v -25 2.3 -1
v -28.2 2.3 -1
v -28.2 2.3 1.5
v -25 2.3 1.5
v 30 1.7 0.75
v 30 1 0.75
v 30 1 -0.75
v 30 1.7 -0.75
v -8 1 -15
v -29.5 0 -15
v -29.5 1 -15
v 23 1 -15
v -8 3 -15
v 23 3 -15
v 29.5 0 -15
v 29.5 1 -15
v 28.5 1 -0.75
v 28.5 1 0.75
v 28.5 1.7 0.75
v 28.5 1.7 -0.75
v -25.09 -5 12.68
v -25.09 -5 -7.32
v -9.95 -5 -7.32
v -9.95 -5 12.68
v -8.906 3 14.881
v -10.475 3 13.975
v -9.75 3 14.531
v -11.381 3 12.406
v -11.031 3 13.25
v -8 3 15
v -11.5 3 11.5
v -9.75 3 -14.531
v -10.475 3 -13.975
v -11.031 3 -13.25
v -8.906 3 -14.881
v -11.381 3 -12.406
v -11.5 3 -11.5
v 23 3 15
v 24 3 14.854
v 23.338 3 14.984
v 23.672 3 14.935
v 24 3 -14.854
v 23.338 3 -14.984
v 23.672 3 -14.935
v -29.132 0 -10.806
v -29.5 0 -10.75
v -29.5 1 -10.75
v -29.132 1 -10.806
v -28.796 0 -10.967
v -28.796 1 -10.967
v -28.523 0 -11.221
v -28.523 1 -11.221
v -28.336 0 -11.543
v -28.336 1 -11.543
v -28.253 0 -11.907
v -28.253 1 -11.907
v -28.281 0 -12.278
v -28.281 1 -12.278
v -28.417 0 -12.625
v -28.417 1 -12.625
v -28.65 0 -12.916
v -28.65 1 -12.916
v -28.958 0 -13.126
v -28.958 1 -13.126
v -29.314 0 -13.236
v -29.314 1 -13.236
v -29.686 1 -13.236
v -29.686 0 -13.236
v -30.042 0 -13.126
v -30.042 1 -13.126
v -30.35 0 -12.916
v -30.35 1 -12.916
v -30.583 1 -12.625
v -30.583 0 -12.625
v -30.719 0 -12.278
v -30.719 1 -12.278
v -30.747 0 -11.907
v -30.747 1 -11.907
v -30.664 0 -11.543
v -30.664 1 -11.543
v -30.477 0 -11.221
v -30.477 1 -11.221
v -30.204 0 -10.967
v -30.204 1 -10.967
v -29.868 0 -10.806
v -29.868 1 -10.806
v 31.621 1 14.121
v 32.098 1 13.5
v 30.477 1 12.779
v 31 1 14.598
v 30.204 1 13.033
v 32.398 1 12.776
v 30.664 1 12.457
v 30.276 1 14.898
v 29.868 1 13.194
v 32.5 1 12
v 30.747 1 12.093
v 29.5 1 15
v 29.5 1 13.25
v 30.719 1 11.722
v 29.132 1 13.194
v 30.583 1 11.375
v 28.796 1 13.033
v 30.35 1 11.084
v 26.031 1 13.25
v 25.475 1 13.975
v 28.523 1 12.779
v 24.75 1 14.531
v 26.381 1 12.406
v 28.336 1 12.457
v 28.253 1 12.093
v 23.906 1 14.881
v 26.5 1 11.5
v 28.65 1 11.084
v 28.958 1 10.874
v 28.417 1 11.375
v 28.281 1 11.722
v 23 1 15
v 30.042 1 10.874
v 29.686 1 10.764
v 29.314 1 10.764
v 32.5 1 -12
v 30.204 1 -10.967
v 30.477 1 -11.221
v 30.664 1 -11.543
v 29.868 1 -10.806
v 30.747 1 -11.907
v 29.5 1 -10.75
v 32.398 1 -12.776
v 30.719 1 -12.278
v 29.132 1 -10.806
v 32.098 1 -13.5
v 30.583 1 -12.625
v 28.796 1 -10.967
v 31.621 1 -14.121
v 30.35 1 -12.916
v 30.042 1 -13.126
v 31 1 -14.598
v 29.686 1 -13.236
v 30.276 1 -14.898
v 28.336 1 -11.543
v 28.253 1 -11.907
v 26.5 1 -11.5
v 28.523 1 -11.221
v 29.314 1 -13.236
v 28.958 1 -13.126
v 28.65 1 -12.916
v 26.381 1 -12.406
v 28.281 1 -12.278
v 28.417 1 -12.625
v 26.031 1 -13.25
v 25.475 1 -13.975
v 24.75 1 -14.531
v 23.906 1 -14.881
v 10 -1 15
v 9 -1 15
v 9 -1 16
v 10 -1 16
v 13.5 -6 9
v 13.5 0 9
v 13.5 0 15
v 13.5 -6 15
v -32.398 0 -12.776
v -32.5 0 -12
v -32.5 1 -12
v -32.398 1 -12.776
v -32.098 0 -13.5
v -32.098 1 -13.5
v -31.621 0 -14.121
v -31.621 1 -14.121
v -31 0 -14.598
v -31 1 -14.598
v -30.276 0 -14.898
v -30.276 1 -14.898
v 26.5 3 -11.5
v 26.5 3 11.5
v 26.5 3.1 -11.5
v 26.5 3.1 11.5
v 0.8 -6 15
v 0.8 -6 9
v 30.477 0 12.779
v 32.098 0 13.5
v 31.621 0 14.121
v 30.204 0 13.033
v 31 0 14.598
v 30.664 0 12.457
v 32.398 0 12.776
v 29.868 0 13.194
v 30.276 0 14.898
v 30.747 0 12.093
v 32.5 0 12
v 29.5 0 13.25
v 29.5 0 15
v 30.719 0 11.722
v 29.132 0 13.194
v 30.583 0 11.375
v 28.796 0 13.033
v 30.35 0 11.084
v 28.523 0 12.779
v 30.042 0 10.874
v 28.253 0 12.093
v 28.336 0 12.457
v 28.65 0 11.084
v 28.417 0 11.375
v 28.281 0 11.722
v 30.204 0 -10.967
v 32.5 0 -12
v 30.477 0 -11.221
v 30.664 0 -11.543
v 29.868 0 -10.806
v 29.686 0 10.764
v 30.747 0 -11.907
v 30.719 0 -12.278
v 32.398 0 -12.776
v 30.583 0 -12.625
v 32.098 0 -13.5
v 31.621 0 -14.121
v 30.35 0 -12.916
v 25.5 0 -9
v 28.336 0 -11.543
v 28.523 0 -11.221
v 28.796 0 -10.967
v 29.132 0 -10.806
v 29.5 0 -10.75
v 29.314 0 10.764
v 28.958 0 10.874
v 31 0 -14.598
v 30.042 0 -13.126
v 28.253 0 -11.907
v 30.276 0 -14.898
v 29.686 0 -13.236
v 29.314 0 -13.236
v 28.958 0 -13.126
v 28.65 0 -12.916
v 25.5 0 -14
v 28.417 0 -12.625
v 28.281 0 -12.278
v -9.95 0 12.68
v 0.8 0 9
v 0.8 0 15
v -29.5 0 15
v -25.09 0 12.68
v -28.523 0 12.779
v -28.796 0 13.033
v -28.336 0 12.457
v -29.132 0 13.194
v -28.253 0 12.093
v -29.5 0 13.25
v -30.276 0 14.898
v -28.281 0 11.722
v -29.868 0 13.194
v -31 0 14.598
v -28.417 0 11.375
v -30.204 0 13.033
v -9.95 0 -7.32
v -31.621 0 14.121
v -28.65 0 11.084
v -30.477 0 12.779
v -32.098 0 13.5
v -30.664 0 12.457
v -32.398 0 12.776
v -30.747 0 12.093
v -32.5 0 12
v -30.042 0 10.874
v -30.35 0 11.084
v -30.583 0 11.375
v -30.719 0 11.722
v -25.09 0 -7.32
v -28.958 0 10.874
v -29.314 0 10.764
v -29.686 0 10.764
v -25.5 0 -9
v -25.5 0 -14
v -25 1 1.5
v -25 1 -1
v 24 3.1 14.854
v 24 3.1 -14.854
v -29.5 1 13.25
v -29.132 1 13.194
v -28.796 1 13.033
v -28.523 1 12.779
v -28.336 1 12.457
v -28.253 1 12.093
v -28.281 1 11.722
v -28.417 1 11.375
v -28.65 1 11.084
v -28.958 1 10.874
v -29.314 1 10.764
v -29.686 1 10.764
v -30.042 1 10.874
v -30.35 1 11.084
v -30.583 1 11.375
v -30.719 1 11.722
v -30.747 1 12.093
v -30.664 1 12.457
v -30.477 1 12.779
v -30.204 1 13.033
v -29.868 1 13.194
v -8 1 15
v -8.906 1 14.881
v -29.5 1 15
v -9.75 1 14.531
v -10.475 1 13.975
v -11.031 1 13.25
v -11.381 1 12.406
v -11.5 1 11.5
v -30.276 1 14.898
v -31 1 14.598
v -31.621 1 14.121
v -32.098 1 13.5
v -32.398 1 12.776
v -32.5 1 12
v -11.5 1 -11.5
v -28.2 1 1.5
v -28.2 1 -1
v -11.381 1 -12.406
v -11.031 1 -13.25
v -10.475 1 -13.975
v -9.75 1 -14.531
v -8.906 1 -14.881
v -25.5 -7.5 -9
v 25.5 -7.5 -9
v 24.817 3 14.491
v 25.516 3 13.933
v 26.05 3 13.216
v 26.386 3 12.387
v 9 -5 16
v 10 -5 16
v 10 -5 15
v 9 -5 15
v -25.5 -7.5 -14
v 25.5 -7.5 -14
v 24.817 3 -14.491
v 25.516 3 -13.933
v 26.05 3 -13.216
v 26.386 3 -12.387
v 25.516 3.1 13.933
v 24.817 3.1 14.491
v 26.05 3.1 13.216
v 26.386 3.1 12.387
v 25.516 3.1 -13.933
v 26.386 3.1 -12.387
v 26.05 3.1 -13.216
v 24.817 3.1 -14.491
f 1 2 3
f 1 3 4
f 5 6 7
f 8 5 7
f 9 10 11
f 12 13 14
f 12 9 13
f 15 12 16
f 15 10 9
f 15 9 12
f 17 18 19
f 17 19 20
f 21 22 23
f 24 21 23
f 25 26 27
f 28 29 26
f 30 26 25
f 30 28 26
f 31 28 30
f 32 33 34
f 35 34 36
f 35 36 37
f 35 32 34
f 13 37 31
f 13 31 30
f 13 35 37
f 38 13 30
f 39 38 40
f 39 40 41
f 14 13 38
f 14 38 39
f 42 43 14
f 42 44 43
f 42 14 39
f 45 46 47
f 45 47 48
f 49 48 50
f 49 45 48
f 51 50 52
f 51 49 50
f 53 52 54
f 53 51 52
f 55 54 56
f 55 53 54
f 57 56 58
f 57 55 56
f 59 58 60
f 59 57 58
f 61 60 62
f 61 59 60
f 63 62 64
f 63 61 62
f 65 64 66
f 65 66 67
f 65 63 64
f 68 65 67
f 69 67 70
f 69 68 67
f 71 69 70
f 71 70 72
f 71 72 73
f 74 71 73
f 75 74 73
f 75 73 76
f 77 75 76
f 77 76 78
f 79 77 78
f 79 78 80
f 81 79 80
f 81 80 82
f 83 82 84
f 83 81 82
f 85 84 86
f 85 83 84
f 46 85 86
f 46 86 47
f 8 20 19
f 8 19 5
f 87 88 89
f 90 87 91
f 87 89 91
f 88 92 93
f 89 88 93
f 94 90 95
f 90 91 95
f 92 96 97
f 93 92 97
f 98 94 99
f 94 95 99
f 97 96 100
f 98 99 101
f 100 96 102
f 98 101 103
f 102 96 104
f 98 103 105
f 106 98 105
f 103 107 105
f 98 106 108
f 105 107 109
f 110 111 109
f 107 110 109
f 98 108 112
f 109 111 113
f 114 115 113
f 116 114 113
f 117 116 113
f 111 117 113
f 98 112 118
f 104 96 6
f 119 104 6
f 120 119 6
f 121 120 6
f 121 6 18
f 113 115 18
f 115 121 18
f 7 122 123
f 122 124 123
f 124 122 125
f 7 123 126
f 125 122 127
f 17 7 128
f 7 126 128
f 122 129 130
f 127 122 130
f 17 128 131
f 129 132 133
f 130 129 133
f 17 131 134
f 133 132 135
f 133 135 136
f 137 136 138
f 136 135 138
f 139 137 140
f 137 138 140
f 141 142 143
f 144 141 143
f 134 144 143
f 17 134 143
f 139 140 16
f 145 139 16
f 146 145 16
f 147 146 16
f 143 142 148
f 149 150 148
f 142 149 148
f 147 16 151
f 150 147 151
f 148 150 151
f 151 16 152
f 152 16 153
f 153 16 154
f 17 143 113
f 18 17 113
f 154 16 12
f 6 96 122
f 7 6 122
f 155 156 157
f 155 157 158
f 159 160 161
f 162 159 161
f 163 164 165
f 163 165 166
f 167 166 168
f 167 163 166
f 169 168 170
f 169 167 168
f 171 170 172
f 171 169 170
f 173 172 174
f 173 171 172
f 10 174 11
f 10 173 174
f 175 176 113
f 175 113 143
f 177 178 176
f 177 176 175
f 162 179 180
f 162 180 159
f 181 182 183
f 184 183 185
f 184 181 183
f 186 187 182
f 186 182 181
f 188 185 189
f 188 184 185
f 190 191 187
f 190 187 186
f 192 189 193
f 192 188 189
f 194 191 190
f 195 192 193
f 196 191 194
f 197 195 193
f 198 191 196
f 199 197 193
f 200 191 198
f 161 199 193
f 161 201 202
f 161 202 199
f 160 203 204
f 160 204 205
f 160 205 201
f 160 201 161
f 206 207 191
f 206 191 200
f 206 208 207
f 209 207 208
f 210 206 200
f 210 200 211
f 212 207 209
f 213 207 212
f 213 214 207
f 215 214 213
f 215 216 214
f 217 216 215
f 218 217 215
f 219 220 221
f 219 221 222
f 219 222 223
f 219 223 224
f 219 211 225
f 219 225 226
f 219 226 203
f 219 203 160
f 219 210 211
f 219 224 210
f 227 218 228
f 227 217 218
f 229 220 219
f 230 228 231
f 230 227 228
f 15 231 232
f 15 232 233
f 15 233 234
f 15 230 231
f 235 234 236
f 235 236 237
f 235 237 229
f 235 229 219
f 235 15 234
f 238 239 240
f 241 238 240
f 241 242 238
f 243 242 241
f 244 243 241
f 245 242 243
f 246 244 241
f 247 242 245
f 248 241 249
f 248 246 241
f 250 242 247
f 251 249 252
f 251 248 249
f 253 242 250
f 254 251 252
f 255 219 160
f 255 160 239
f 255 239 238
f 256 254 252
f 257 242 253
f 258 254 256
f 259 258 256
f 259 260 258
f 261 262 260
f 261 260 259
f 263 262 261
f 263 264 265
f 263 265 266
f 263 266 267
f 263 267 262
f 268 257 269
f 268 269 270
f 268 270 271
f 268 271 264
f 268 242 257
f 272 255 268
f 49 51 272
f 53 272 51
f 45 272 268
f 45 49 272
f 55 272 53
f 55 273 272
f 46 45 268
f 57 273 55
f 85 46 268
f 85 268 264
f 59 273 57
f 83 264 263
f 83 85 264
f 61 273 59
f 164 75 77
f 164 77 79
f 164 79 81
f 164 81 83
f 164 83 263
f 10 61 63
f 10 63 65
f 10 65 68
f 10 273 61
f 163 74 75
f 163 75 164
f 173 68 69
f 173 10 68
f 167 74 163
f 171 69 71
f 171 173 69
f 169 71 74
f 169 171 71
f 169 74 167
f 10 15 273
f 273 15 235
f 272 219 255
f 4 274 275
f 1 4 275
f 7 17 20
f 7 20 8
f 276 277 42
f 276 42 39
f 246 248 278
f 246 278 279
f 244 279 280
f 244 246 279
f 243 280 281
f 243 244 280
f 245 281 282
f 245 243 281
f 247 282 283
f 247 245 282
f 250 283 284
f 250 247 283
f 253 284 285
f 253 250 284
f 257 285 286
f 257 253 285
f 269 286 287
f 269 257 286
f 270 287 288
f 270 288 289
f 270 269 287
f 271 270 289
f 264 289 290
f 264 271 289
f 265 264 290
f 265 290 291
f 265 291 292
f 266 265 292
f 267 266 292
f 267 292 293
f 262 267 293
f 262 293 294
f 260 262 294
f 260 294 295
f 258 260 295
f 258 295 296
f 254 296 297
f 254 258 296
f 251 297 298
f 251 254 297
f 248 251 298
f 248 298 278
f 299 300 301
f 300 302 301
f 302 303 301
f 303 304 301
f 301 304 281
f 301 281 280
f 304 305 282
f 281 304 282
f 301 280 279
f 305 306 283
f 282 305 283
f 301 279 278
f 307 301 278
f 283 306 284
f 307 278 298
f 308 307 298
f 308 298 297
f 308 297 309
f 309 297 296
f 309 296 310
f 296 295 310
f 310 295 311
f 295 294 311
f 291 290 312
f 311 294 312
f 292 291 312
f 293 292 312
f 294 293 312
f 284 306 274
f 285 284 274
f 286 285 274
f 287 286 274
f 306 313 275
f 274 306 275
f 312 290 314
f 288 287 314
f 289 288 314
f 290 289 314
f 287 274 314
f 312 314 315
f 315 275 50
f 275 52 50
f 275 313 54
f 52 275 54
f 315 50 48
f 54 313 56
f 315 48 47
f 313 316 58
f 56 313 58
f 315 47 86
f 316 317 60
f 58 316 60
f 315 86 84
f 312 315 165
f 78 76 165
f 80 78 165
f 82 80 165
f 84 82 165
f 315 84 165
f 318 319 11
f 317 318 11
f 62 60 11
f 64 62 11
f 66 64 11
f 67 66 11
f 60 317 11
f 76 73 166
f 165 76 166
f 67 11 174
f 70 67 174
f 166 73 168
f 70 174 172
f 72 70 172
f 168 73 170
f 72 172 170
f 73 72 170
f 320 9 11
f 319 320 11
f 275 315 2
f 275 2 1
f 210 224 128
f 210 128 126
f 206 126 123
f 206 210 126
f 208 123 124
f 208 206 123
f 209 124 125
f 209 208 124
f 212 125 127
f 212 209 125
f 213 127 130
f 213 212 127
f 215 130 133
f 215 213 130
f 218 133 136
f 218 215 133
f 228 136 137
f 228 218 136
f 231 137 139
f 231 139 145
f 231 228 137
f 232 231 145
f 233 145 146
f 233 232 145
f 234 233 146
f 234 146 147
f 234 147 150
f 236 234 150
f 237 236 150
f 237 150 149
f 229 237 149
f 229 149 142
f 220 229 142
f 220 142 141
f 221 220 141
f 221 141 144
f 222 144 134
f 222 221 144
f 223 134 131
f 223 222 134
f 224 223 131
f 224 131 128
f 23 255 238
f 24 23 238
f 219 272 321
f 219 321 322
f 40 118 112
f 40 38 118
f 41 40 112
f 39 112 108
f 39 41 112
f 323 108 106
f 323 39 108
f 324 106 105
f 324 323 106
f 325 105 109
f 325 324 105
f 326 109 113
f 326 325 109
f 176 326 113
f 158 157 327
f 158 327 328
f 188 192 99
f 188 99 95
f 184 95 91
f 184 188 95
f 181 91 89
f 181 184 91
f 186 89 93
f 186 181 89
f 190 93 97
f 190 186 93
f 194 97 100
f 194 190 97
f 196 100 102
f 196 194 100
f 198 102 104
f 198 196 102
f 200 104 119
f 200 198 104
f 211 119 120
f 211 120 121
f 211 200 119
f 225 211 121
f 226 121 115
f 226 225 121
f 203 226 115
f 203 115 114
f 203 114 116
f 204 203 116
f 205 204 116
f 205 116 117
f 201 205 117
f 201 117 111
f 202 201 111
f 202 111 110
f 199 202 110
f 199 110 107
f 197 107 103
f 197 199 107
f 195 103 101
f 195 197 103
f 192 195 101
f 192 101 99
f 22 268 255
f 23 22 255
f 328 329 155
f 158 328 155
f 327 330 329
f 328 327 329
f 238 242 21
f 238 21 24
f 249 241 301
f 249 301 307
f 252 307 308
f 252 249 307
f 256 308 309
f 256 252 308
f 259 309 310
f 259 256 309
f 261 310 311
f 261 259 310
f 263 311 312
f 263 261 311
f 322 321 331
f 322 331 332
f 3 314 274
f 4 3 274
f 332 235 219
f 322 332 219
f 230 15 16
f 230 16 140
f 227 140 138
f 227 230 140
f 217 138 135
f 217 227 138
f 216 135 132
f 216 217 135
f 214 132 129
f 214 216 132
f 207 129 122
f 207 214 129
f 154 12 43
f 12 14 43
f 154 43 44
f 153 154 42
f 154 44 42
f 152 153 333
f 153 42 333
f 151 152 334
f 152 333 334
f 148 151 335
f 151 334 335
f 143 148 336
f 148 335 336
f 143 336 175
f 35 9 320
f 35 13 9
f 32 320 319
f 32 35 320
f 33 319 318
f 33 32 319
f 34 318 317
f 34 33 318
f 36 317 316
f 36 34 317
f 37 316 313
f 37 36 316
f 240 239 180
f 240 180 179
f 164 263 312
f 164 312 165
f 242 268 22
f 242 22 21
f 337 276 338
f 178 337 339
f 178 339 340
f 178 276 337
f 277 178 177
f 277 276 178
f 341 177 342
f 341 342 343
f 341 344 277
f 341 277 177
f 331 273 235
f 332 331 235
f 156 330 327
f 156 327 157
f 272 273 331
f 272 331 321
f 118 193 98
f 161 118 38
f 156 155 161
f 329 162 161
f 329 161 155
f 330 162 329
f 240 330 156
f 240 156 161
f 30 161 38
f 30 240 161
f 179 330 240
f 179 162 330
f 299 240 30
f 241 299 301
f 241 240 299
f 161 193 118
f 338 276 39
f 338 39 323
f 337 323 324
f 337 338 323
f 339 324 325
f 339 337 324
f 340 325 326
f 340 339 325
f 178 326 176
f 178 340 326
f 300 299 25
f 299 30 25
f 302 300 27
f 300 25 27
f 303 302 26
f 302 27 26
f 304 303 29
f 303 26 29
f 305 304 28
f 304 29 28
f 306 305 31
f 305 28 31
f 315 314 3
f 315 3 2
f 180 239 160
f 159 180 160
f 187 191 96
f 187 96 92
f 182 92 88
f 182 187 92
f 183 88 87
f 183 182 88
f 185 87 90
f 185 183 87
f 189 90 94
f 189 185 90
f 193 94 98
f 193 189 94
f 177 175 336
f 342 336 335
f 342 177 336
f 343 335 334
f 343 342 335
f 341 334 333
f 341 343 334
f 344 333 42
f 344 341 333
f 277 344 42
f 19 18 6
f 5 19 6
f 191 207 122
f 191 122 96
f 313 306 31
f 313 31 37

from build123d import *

# Parameters (mm, degrees)
SKETCH_1_R       = 1.25
BOARD_DEPTH      = 1
SKETCH_2_W       = 38
SKETCH_2_H       = 30
SCREEN_DEPTH     = 2
SCREEN_RADIUS_R  = 3.5
SKETCH_3_W       = 51
SKETCH_3_H       = 5
PLUG_DEPTH       = 7.5
SKETCH_4_W       = 15.14
SKETCH_4_H       = 20
SPEAKER_DEPTH    = 5
SKETCH_5_W       = 12.7
SKETCH_5_H       = 6
BUTTON_DEPTH     = 6
SKETCH_6_W       = 1
SKETCH_6_H       = 4
BUTTON_TAP_DEPTH = 1
SKETCH_7_W       = 1.5
SKETCH_7_H       = 1.5
RGB_LED_DEPTH    = 0.7
SKETCH_8_W       = 3.2
SKETCH_8_H       = 2.5
MIC_DEPTH        = 1.3
EXTRUDE_START    = 0.1
EXTRUDE_1_DEPTH  = 0.1


with BuildPart() as part:
    # 草图1 → board (new body)
    with BuildSketch(Plane(origin=(0, 0, 0), x_dir=(1, 0, 0), z_dir=(0, 1, 0))):
        with BuildLine():
            Line((-29.5, 15), (29.5, 15))
            ThreePointArc((29.5, 15), (31.621320344, 14.121320344), (32.5, 12))
            Line((32.5, 12), (32.5, -12))
            ThreePointArc((32.5, -12), (31.621320344, -14.121320344), (29.5, -15))
            Line((29.5, -15), (-29.5, -15))
            ThreePointArc((-29.5, -15), (-31.621320344, -14.121320344), (-32.5, -12))
            Line((-32.5, -12), (-32.5, 12))
            ThreePointArc((-32.5, 12), (-31.621320344, 14.121320344), (-29.5, 15))
        make_face()
        with Locations(Location((-29.5, 12, 0), (0, 0, 270))):
            Circle(SKETCH_1_R, mode=Mode.SUBTRACT)
        with Locations(Location((29.5, 12, 0), (0, 0, 270))):
            Circle(SKETCH_1_R, mode=Mode.SUBTRACT)
        with Locations(Location((-29.5, -12, 0), (0, 0, 270))):
            Circle(SKETCH_1_R, mode=Mode.SUBTRACT)
        with Locations(Location((29.5, -12, 0), (0, 0, 270))):
            Circle(SKETCH_1_R, mode=Mode.SUBTRACT)
    extrude(amount=BOARD_DEPTH)

    # 草图2 → screen (add)
    with BuildSketch(Plane(origin=(0, 1, 0), x_dir=(1, 0, 0), z_dir=(0, 1, 0))):
        with Locations((7.5, 0)):
            Rectangle(SKETCH_2_W, SKETCH_2_H)
    extrude(amount=SCREEN_DEPTH)

    # screen-radius
    screen_radius_edges = [part.edges().sort_by_distance(p)[0] for p in [
        (-11.5, 2, -15),
        (-11.5, 2, 15),
        (26.5, 2, 15),
        (26.5, 2, -15),
    ]]
    fillet(screen_radius_edges, radius=SCREEN_RADIUS_R)

    # 草图3 → plug (add)
    with BuildSketch(Plane.XZ):
        with Locations((0, -11.5)):
            Rectangle(SKETCH_3_W, SKETCH_3_H)
    extrude(amount=PLUG_DEPTH)

    # 草图4 → speaker (add)
    with BuildSketch(Plane.XZ):
        with Locations((-17.52, 2.68)):
            Rectangle(SKETCH_4_W, SKETCH_4_H)
    extrude(amount=SPEAKER_DEPTH)

    # 草图5 → button (add)
    with BuildSketch(Plane.XZ):
        with Locations((7.15, 12)):
            Rectangle(SKETCH_5_W, SKETCH_5_H)
    extrude(amount=BUTTON_DEPTH)

    # 草图6 → button-tap (add)
    with BuildSketch(Plane.XY.offset(15)):
        with Locations((9.5, -3)):
            Rectangle(SKETCH_6_W, SKETCH_6_H)
    extrude(amount=BUTTON_TAP_DEPTH)

    # 草图7 → rgb-led (add)
    with BuildSketch(Plane(origin=(0, 1, 0), x_dir=(1, 0, 0), z_dir=(0, 1, 0))):
        with Locations((29.25, 0)):
            Rectangle(SKETCH_7_W, SKETCH_7_H)
    extrude(amount=RGB_LED_DEPTH)

    # 草图8 → mic (add)
    with BuildSketch(Plane(origin=(0, 1, 0), x_dir=(1, 0, 0), z_dir=(0, 1, 0))):
        with Locations((-26.6, -0.25)):
            Rectangle(SKETCH_8_W, SKETCH_8_H)
    extrude(amount=MIC_DEPTH)

    # 草图9 → 凸台-拉伸1 (add)
    with BuildSketch(Plane(origin=(0, 3, 0), x_dir=(1, 0, 0), z_dir=(0, 1, 0)).offset(EXTRUDE_START)):
        with BuildLine():
            Line((26.5, -11.5), (26.5, 11.5))
            ThreePointArc((26.5, 11.5), (25.80624304, 13.591650066), (24, 14.854101966))
            Line((24, 14.854101966), (24, -14.854101966))
            ThreePointArc((24, -14.854101966), (25.80624304, -13.591650066), (26.5, -11.5))
        make_face()
    extrude(amount=-EXTRUDE_1_DEPTH)


solid = part.part
